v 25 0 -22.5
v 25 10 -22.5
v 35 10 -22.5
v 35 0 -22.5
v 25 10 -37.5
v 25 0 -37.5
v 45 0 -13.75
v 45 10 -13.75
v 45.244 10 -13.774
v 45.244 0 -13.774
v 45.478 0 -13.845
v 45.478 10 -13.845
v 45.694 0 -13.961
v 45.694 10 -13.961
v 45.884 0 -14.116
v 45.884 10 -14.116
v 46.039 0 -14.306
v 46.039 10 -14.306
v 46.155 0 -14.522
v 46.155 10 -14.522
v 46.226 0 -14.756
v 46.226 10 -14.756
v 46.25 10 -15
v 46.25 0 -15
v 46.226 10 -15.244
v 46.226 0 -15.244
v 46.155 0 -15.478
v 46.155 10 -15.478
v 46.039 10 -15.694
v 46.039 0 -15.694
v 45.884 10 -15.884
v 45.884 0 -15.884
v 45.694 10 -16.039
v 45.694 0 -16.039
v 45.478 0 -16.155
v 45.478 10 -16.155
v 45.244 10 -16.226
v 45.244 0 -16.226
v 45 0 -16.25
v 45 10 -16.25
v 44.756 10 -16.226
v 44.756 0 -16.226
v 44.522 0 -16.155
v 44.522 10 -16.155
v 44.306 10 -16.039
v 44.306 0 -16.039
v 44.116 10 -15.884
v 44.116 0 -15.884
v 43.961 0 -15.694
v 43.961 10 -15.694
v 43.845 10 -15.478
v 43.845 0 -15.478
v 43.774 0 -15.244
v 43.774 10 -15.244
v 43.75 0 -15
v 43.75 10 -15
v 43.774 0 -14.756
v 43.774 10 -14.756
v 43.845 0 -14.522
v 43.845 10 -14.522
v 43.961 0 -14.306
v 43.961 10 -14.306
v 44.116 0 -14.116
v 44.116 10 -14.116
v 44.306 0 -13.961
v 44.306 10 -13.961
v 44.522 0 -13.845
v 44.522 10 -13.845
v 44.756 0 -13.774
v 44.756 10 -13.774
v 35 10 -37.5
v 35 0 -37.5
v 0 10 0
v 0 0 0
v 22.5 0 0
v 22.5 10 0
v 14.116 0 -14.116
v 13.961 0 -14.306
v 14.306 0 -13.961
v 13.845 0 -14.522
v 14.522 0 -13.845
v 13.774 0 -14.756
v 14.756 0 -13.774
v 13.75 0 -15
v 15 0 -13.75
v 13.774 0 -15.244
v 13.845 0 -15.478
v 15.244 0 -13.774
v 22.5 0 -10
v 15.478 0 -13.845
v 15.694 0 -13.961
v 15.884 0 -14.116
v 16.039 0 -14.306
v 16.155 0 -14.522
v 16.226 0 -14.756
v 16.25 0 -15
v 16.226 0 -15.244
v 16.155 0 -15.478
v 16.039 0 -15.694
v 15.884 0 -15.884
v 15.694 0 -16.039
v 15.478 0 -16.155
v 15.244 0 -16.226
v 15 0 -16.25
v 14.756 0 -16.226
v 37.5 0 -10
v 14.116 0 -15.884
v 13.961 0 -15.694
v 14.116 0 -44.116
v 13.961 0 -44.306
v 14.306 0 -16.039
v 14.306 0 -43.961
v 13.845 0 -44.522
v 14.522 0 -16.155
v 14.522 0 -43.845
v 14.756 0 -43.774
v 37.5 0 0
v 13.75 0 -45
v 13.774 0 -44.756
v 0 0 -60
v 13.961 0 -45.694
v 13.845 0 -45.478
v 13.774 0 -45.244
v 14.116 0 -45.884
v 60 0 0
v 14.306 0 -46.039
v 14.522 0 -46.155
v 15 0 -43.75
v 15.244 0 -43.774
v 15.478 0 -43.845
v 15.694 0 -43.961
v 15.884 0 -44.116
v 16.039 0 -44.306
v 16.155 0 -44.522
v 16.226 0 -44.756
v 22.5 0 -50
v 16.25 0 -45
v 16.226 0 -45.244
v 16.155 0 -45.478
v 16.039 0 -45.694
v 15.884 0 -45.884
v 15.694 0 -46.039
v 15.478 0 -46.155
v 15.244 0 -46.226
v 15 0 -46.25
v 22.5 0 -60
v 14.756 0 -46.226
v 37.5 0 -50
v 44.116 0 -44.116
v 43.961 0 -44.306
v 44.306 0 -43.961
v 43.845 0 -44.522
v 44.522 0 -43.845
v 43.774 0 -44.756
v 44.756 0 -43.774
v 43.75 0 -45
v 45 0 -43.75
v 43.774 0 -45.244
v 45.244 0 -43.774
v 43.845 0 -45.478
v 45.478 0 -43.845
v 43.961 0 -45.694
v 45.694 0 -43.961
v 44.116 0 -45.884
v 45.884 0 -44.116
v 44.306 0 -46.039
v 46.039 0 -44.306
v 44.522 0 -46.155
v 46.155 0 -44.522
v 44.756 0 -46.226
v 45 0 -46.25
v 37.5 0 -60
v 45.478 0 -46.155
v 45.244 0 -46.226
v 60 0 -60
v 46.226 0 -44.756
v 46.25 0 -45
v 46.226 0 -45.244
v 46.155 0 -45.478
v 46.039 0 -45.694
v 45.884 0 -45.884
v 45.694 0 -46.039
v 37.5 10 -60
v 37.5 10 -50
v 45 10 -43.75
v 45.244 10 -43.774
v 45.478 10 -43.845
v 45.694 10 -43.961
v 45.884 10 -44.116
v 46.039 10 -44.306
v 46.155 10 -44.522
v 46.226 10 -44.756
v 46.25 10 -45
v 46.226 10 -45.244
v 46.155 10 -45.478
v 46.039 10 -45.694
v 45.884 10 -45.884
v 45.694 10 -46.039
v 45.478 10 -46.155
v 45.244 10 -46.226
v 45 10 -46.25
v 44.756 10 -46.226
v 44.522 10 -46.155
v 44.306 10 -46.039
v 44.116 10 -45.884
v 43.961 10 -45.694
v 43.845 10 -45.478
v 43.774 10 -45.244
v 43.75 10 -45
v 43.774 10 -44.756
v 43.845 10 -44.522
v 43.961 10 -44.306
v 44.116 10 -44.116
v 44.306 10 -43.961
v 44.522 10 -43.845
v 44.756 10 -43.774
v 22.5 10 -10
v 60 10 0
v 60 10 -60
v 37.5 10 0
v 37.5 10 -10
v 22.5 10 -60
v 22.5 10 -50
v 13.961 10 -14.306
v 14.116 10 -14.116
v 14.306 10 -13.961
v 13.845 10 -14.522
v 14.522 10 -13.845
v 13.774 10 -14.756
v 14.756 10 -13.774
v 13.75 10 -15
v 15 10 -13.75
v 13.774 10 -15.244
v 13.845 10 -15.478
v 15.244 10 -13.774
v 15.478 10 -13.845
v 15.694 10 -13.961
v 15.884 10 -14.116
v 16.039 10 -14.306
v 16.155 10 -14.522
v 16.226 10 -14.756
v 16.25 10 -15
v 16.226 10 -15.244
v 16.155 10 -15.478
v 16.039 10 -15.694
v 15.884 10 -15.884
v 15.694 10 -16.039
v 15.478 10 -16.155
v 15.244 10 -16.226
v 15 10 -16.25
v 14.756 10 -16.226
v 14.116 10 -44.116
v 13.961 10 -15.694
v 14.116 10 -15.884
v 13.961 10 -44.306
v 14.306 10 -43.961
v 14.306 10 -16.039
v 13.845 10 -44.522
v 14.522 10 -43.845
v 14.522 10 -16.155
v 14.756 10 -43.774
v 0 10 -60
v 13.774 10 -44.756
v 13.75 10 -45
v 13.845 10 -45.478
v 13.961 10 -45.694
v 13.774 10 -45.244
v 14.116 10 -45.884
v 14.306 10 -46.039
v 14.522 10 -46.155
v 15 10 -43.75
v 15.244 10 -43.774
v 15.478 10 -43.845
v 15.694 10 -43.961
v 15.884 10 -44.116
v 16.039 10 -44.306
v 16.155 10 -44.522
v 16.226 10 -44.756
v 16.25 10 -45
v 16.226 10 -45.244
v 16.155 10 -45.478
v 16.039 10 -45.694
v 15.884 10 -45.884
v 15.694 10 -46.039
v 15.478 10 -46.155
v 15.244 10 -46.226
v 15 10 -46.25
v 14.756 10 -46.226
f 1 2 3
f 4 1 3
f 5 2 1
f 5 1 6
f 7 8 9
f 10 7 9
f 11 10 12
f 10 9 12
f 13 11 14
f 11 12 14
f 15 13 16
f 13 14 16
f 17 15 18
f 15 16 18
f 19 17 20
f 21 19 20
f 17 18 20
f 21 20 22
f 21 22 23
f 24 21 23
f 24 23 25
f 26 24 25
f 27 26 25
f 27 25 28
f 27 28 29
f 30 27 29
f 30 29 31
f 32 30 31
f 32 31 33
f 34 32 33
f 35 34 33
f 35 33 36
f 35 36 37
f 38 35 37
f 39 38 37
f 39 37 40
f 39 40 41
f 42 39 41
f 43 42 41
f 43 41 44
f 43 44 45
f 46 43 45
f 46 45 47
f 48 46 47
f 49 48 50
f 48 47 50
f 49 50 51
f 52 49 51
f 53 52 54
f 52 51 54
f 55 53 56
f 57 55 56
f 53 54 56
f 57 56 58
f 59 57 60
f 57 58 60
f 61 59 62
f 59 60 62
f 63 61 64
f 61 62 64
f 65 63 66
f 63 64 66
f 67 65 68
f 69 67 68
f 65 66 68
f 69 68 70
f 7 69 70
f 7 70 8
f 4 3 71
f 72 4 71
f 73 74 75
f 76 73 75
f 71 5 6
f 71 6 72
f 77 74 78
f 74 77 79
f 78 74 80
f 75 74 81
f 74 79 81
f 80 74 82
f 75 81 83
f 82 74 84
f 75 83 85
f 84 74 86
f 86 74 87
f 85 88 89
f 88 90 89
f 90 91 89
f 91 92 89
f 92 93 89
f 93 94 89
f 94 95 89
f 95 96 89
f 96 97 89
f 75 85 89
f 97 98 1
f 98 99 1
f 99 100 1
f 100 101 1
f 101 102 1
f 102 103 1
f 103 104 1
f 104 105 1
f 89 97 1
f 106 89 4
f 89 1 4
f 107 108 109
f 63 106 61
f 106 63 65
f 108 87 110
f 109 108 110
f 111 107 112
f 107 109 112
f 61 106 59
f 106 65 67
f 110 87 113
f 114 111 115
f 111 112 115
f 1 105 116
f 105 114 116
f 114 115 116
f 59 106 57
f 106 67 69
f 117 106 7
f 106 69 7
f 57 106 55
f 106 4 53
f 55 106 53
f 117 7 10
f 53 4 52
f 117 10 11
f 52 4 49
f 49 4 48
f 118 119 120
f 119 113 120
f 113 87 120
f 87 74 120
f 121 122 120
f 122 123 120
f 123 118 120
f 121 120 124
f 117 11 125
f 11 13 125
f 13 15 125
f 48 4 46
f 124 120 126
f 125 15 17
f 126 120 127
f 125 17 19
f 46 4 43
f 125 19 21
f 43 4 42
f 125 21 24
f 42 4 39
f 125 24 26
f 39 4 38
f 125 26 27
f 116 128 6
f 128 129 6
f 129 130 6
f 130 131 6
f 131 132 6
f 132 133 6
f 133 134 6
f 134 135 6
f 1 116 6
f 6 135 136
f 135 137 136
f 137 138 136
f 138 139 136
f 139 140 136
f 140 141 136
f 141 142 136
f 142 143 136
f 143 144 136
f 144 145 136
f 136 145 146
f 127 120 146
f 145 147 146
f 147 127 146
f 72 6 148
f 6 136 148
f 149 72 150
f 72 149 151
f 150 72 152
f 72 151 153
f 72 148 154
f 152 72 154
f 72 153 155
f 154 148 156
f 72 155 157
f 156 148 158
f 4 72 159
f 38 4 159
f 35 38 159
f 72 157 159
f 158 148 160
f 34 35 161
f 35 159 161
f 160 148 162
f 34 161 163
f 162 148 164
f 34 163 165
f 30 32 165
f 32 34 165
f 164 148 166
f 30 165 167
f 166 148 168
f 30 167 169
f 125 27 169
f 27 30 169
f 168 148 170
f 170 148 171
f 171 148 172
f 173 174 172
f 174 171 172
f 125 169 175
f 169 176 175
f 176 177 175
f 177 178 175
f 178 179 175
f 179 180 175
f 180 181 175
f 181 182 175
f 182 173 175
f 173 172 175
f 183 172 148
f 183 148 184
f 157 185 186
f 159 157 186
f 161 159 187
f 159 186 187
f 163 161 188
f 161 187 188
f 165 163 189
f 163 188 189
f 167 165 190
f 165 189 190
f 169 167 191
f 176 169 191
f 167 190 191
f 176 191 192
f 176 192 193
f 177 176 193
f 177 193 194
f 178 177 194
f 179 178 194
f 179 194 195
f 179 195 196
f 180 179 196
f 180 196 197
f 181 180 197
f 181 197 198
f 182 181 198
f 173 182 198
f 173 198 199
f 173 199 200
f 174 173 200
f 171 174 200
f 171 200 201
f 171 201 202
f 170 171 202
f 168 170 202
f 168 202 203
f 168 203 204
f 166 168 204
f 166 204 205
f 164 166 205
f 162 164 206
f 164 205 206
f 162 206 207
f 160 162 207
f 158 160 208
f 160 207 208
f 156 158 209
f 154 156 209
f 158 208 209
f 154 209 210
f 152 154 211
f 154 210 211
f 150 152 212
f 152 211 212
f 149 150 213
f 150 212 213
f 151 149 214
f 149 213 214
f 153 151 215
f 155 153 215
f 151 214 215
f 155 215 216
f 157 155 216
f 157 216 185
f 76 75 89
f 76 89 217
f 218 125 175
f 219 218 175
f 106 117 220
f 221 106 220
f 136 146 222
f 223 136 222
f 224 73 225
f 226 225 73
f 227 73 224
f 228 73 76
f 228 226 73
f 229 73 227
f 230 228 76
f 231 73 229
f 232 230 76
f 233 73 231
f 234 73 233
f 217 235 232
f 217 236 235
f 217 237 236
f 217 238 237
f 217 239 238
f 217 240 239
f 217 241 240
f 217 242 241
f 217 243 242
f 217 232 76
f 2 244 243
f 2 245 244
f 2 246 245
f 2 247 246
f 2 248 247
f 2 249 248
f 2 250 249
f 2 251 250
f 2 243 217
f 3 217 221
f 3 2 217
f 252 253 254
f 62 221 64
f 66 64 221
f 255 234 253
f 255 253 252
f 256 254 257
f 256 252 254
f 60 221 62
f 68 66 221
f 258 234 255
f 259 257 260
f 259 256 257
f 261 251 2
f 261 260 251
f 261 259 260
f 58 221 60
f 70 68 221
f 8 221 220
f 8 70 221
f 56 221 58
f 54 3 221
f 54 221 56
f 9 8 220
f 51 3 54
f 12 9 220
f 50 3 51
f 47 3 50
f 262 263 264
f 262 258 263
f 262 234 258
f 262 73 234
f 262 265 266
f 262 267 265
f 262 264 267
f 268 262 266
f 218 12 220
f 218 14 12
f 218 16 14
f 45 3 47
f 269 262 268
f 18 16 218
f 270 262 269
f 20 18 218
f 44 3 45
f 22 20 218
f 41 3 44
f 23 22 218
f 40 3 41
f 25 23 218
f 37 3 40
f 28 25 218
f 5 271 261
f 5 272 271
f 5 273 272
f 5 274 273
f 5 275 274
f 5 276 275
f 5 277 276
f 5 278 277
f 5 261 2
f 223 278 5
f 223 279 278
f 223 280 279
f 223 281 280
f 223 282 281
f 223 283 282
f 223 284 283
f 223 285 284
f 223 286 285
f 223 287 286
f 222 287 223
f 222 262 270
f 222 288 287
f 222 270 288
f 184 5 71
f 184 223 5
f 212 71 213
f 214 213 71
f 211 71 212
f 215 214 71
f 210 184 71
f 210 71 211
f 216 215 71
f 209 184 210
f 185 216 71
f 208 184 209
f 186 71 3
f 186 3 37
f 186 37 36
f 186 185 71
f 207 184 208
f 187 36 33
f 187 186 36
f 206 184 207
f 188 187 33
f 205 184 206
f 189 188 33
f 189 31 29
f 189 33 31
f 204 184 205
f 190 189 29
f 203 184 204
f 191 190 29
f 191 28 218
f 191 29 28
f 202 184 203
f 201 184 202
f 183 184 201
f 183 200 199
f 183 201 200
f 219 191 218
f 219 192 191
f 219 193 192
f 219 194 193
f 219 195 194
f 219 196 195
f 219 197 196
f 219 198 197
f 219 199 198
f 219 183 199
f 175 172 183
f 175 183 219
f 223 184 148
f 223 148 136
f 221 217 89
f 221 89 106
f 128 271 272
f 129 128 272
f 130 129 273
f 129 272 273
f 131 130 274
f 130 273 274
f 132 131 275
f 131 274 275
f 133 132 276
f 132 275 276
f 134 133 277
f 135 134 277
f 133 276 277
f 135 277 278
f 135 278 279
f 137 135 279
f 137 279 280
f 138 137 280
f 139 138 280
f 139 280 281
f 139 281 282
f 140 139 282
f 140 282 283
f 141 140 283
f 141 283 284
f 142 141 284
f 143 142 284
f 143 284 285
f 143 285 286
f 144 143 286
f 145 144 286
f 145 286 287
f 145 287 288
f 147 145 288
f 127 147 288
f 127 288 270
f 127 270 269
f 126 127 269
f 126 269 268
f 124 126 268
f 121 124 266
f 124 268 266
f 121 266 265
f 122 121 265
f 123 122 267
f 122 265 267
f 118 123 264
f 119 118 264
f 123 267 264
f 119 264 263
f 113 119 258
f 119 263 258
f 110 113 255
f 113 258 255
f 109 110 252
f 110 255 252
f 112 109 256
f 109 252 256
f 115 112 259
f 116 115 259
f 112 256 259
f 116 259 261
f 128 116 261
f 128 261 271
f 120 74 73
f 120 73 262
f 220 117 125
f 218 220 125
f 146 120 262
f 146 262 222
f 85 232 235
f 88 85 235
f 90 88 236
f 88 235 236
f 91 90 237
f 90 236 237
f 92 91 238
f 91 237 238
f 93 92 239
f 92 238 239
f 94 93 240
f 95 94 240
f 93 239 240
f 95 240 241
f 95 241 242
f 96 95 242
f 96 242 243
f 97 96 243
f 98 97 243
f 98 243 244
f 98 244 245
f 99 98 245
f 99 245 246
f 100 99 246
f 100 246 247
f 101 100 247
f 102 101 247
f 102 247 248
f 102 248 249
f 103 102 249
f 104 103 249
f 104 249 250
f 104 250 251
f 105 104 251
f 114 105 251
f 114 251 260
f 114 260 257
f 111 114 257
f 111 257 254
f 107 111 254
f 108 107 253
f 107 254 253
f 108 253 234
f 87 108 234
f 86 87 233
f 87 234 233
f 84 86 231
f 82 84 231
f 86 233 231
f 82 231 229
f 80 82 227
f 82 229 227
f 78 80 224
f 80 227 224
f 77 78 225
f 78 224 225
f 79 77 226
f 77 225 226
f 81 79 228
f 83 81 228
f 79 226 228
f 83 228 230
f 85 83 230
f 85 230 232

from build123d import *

# Parameters (mm, degrees)
ESBO_O1_W                = 60
ESBO_O1_H                = 60
RESSALTO_EXTRUS_O1_DEPTH = 10
ESBO_O2_W                = 15
ESBO_O2_H                = 10
CORTE_EXTRUS_O1_DEPTH    = 10
ESBO_O3_W                = 15
ESBO_O3_H                = 10
CORTE_EXTRUS_O2_DEPTH    = 10
ESBO_O4_W                = 10
ESBO_O4_H                = 15
CORTE_EXTRUS_O3_DEPTH    = 86.440037453
ESBO_O5_R                = 1.25
CORTE_EXTRUS_O4_DEPTH    = 86.440037453


with BuildPart() as part:
    # Esboço1 → Ressalto-extrusão1 (new body)
    with BuildSketch(Plane(origin=(0, 0, 0), x_dir=(1, 0, 0), z_dir=(0, 1, 0))):
        with Locations((30, 30)):
            Rectangle(ESBO_O1_W, ESBO_O1_H)
    extrude(amount=RESSALTO_EXTRUS_O1_DEPTH)

    # Esboço2 → Corte-extrusão1 (cut)
    with BuildSketch(Plane.XY):
        with Locations((30, 5)):
            Rectangle(ESBO_O2_W, ESBO_O2_H)
    extrude(amount=-CORTE_EXTRUS_O1_DEPTH, mode=Mode.SUBTRACT)

    # Esboço3 → Corte-extrusão2 (cut)
    with BuildSketch(Plane(origin=(0, 0, -60), x_dir=(-1, 0, 0), z_dir=(0, 0, -1))):
        with Locations((-30, 5)):
            Rectangle(ESBO_O3_W, ESBO_O3_H)
    extrude(amount=-CORTE_EXTRUS_O2_DEPTH, mode=Mode.SUBTRACT)

    # Esboço4 → Corte-extrusão3 (cut, through all)
    with BuildSketch(Plane(origin=(0, 10, 0), x_dir=(1, 0, 0), z_dir=(0, 1, 0))):
        with Locations((30, 30)):
            Rectangle(ESBO_O4_W, ESBO_O4_H)
    extrude(amount=-CORTE_EXTRUS_O3_DEPTH, mode=Mode.SUBTRACT)

    # Esboço5 → Corte-extrusão4 (cut, through all)
    with BuildSketch(Plane(origin=(0, 10, 0), x_dir=(1, 0, 0), z_dir=(0, 1, 0))):
        with Locations(Location((45, 45, 0), (0, 0, 270))):
            Circle(ESBO_O5_R)
        with Locations(Location((15, 45, 0), (0, 0, 270))):
            Circle(ESBO_O5_R)
        with Locations(Location((45, 15, 0), (0, 0, 270))):
            Circle(ESBO_O5_R)
        with Locations(Location((15, 15, 0), (0, 0, 270))):
            Circle(ESBO_O5_R)
    extrude(amount=-CORTE_EXTRUS_O4_DEPTH, mode=Mode.SUBTRACT)


solid = part.part
